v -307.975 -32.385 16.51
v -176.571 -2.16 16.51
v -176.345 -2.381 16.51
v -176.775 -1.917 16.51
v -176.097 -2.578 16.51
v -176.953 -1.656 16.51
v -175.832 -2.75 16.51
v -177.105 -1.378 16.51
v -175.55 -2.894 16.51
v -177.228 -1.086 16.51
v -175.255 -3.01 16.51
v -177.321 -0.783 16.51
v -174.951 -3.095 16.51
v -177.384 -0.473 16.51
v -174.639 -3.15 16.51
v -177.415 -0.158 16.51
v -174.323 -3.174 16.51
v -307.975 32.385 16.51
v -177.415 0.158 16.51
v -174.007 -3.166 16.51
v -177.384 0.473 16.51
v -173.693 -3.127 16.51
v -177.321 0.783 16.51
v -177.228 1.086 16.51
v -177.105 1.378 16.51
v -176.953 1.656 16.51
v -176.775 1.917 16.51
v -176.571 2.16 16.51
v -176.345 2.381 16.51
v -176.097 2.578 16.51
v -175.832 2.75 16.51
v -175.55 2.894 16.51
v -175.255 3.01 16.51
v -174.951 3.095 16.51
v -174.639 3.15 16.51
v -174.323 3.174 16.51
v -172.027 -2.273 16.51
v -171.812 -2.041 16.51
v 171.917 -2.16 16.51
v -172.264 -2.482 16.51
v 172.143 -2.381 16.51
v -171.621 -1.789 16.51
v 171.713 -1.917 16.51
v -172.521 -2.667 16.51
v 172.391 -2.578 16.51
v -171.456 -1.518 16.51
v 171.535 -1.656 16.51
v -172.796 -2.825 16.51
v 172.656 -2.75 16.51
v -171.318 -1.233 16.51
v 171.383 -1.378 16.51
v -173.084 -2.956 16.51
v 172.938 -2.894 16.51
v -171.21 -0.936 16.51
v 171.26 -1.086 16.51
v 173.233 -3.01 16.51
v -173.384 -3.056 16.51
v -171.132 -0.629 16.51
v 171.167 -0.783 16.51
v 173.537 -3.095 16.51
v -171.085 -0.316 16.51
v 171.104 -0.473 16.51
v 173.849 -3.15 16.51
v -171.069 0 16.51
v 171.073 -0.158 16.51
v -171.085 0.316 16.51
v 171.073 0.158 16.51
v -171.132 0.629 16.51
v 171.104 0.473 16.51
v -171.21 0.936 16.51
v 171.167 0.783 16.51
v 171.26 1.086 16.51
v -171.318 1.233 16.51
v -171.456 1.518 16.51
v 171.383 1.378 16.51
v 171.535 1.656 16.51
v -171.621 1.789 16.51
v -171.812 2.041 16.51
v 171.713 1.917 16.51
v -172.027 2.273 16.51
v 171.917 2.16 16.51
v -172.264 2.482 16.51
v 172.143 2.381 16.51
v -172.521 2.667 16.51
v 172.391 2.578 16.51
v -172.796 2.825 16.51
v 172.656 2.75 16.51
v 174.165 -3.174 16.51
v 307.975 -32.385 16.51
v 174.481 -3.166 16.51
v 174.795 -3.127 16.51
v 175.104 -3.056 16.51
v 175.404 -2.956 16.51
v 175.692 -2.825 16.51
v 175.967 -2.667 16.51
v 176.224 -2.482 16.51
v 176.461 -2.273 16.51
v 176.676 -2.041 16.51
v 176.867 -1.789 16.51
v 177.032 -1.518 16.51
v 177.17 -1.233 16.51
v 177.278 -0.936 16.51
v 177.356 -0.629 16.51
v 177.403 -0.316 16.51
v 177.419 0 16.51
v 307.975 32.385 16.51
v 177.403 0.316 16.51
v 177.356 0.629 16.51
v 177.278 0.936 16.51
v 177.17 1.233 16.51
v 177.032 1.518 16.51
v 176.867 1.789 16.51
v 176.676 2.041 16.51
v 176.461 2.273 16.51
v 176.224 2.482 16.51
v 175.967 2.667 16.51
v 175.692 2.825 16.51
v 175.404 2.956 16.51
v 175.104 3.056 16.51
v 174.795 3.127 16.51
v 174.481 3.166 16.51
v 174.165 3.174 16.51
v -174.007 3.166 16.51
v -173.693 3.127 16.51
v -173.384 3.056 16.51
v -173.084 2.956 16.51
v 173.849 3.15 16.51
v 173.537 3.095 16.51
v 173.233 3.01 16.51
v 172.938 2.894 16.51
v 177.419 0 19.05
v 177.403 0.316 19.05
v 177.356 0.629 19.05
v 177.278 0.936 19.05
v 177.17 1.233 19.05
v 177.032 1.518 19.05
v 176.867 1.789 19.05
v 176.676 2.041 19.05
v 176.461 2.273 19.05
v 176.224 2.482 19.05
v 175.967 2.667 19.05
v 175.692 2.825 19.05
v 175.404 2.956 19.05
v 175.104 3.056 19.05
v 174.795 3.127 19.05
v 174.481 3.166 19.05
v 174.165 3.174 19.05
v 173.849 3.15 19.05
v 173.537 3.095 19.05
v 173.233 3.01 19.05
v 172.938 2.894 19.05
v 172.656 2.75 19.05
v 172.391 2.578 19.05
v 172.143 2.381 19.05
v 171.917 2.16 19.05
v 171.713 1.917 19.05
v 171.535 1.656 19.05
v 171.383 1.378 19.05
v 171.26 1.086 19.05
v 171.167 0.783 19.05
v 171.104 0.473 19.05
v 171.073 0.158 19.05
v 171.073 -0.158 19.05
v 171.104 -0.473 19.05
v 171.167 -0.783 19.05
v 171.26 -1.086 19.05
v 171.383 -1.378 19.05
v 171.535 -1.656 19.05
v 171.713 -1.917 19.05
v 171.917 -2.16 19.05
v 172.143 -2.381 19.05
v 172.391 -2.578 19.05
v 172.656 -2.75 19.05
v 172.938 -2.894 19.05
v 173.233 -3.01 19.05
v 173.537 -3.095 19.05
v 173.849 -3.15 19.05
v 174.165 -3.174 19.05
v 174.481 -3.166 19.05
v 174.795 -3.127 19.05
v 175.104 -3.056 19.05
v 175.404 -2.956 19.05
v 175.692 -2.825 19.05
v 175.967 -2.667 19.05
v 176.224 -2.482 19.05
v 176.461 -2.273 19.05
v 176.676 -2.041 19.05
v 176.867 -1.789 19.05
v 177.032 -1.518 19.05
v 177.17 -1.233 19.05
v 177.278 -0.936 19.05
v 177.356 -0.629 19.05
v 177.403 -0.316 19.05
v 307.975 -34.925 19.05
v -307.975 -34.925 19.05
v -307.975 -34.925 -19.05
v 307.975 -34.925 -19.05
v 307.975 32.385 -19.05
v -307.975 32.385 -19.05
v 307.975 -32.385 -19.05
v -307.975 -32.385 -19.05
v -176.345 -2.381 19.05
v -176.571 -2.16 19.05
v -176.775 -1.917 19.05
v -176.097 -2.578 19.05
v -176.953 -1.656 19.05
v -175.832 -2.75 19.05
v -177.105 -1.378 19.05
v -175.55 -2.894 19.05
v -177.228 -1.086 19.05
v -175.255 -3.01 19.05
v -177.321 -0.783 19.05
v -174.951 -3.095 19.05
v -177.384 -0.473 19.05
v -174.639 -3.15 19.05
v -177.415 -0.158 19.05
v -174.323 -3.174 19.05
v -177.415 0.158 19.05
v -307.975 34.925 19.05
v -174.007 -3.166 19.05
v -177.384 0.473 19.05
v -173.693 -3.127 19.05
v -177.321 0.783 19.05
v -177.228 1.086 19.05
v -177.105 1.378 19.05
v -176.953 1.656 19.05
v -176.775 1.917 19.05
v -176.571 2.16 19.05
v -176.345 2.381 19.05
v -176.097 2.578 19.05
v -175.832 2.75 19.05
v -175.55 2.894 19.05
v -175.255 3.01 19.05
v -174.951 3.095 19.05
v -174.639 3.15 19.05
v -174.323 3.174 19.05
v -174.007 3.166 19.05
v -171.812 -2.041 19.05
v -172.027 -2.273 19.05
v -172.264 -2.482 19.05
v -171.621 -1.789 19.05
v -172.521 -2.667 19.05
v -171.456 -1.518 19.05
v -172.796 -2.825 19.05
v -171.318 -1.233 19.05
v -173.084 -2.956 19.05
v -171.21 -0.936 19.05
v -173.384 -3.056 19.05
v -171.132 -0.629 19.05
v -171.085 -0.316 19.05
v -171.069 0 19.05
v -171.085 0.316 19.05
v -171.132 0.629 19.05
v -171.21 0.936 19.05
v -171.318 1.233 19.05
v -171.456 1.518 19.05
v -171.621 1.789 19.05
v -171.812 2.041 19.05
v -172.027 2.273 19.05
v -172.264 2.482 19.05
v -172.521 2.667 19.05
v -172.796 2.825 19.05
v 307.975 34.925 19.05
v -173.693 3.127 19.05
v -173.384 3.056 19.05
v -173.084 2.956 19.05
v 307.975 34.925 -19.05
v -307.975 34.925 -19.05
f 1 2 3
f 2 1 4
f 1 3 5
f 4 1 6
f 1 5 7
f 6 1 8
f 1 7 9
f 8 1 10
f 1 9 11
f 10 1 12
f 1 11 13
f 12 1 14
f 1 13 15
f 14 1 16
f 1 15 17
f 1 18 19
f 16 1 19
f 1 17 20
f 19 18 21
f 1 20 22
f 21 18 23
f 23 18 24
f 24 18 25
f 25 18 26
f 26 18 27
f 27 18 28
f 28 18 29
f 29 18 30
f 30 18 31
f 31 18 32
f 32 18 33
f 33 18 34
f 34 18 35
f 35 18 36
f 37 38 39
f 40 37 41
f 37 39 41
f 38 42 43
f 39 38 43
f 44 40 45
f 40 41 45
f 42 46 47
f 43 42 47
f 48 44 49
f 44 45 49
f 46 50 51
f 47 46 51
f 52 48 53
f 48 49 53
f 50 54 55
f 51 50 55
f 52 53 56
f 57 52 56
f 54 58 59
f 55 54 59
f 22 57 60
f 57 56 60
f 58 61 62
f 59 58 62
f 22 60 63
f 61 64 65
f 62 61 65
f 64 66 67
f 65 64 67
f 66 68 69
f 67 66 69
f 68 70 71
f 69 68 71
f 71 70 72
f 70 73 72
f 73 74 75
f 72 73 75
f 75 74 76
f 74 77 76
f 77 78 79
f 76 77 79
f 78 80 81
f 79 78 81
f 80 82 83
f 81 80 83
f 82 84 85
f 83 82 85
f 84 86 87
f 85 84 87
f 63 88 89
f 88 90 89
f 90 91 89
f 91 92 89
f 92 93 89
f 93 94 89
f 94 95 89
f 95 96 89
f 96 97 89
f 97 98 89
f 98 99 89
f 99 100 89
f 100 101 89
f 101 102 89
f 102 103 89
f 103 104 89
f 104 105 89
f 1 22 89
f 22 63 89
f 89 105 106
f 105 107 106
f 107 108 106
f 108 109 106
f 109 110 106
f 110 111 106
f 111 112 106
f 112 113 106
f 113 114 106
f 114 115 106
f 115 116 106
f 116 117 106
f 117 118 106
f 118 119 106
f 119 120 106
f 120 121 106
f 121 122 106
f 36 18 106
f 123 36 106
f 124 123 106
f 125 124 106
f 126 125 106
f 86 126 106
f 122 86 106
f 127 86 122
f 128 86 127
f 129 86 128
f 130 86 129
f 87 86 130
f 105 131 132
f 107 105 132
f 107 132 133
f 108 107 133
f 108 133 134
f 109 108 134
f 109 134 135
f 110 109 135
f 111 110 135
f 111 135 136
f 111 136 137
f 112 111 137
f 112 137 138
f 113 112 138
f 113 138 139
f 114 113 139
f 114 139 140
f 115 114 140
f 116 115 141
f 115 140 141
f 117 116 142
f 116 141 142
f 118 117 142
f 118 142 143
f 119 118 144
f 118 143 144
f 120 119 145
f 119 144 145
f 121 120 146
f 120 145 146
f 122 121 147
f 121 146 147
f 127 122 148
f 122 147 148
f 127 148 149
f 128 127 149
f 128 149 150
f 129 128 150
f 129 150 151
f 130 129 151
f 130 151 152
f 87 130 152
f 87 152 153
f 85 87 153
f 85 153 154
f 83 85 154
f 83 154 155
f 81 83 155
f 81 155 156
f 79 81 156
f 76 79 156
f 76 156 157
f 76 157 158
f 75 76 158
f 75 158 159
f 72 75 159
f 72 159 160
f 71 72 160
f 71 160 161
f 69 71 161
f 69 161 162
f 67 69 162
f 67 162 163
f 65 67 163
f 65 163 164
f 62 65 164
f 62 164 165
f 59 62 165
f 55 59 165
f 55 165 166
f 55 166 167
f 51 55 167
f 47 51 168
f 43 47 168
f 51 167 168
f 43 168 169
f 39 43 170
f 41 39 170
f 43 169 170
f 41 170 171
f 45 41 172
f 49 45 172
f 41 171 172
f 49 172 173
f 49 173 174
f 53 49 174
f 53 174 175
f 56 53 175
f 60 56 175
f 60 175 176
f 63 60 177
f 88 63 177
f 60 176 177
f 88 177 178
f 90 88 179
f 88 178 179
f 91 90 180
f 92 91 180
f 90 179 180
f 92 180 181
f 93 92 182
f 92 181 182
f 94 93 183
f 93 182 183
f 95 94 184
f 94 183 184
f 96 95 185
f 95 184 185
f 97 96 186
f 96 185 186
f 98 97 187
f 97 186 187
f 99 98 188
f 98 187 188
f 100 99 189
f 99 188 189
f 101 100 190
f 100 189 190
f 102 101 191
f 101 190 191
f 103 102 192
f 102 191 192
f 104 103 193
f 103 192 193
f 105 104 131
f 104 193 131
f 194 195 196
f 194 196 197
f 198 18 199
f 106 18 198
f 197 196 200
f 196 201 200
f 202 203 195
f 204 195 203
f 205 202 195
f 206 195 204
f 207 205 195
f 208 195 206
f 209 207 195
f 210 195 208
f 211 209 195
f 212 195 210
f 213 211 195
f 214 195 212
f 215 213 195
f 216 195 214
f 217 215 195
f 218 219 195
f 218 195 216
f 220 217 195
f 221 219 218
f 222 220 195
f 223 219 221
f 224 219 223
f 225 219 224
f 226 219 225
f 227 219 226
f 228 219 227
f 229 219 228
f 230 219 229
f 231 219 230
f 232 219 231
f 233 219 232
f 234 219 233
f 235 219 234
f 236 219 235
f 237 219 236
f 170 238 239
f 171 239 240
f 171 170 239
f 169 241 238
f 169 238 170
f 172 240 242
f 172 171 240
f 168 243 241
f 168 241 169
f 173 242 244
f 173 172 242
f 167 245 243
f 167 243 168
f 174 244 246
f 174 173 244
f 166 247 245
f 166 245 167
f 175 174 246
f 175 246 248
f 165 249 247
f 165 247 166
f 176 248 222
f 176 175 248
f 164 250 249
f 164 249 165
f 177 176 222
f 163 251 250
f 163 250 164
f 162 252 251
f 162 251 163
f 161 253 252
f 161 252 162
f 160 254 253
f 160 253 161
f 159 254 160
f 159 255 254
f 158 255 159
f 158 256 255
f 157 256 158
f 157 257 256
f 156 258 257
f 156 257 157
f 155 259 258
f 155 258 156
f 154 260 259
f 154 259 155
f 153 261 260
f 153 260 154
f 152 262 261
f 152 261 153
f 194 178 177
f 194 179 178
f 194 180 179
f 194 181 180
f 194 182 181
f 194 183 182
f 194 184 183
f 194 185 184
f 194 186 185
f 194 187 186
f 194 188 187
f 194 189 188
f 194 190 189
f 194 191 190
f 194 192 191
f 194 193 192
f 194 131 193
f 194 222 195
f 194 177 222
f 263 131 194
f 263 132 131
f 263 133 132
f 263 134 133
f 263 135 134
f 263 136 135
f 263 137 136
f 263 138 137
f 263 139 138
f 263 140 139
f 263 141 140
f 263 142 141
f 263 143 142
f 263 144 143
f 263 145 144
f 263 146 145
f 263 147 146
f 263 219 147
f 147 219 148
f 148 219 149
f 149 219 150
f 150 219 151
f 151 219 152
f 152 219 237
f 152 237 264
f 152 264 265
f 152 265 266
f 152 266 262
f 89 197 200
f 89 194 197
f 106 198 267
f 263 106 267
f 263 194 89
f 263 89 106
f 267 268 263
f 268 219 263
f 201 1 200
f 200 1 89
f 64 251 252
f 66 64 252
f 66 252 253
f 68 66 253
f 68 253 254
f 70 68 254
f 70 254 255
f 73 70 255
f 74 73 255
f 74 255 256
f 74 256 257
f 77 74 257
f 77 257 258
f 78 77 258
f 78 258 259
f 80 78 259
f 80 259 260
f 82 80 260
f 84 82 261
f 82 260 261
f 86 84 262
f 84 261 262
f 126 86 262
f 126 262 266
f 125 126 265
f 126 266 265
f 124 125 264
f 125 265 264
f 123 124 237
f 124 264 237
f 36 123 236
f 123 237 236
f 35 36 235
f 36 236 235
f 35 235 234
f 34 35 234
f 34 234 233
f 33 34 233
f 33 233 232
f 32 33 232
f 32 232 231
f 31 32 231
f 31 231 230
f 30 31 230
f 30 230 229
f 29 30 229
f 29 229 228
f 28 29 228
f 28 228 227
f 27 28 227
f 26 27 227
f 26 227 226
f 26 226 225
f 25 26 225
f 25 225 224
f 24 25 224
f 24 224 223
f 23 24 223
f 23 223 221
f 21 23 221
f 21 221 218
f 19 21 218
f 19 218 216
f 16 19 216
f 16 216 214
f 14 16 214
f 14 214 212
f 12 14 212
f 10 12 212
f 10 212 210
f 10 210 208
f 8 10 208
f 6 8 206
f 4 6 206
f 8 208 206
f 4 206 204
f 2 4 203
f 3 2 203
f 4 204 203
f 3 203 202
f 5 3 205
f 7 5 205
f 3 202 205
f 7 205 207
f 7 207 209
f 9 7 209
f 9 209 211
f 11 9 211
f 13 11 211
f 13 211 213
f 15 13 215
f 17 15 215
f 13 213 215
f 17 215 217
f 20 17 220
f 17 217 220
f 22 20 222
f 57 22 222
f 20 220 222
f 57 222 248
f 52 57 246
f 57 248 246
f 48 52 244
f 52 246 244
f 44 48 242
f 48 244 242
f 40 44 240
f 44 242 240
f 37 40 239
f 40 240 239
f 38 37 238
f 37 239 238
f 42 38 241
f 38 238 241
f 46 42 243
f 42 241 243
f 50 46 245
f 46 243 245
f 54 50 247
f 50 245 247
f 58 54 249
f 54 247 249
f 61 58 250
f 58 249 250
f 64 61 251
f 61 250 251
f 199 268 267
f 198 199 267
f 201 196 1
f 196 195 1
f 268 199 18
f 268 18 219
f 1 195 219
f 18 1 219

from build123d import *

# Parameters (mm, degrees)
F0_W     = 615.95
F0_H     = 69.85
F1_DEPTH = 19.05
F2_T     = -2.54
F3_R     = 3.175
F4_DEPTH = 38.101


with BuildPart() as f1:
    # F0 (on Top) → F1 (new body, symmetric)
    with BuildSketch(Plane.XY):
        Rectangle(F0_W, F0_H)
    extrude(amount=F1_DEPTH, both=True)

    # F2
    f2_openings = [f1.faces().sort_by_distance(p)[0] for p in [
        (0, 0, -19.05),
        (307.975, 0, 0),
        (-307.975, 0, 0),
    ]]
    offset(amount=F2_T, openings=f2_openings)

    # F3 (on face) → F4 (cut, through all)
    with BuildSketch(Plane.XY.offset(19.05)):
        with Locations((-174.244, 0)):
            Circle(F3_R)
        with Locations((174.244, 0)):
            Circle(F3_R)
    extrude(amount=-F4_DEPTH, mode=Mode.SUBTRACT)


solid = f1.part
